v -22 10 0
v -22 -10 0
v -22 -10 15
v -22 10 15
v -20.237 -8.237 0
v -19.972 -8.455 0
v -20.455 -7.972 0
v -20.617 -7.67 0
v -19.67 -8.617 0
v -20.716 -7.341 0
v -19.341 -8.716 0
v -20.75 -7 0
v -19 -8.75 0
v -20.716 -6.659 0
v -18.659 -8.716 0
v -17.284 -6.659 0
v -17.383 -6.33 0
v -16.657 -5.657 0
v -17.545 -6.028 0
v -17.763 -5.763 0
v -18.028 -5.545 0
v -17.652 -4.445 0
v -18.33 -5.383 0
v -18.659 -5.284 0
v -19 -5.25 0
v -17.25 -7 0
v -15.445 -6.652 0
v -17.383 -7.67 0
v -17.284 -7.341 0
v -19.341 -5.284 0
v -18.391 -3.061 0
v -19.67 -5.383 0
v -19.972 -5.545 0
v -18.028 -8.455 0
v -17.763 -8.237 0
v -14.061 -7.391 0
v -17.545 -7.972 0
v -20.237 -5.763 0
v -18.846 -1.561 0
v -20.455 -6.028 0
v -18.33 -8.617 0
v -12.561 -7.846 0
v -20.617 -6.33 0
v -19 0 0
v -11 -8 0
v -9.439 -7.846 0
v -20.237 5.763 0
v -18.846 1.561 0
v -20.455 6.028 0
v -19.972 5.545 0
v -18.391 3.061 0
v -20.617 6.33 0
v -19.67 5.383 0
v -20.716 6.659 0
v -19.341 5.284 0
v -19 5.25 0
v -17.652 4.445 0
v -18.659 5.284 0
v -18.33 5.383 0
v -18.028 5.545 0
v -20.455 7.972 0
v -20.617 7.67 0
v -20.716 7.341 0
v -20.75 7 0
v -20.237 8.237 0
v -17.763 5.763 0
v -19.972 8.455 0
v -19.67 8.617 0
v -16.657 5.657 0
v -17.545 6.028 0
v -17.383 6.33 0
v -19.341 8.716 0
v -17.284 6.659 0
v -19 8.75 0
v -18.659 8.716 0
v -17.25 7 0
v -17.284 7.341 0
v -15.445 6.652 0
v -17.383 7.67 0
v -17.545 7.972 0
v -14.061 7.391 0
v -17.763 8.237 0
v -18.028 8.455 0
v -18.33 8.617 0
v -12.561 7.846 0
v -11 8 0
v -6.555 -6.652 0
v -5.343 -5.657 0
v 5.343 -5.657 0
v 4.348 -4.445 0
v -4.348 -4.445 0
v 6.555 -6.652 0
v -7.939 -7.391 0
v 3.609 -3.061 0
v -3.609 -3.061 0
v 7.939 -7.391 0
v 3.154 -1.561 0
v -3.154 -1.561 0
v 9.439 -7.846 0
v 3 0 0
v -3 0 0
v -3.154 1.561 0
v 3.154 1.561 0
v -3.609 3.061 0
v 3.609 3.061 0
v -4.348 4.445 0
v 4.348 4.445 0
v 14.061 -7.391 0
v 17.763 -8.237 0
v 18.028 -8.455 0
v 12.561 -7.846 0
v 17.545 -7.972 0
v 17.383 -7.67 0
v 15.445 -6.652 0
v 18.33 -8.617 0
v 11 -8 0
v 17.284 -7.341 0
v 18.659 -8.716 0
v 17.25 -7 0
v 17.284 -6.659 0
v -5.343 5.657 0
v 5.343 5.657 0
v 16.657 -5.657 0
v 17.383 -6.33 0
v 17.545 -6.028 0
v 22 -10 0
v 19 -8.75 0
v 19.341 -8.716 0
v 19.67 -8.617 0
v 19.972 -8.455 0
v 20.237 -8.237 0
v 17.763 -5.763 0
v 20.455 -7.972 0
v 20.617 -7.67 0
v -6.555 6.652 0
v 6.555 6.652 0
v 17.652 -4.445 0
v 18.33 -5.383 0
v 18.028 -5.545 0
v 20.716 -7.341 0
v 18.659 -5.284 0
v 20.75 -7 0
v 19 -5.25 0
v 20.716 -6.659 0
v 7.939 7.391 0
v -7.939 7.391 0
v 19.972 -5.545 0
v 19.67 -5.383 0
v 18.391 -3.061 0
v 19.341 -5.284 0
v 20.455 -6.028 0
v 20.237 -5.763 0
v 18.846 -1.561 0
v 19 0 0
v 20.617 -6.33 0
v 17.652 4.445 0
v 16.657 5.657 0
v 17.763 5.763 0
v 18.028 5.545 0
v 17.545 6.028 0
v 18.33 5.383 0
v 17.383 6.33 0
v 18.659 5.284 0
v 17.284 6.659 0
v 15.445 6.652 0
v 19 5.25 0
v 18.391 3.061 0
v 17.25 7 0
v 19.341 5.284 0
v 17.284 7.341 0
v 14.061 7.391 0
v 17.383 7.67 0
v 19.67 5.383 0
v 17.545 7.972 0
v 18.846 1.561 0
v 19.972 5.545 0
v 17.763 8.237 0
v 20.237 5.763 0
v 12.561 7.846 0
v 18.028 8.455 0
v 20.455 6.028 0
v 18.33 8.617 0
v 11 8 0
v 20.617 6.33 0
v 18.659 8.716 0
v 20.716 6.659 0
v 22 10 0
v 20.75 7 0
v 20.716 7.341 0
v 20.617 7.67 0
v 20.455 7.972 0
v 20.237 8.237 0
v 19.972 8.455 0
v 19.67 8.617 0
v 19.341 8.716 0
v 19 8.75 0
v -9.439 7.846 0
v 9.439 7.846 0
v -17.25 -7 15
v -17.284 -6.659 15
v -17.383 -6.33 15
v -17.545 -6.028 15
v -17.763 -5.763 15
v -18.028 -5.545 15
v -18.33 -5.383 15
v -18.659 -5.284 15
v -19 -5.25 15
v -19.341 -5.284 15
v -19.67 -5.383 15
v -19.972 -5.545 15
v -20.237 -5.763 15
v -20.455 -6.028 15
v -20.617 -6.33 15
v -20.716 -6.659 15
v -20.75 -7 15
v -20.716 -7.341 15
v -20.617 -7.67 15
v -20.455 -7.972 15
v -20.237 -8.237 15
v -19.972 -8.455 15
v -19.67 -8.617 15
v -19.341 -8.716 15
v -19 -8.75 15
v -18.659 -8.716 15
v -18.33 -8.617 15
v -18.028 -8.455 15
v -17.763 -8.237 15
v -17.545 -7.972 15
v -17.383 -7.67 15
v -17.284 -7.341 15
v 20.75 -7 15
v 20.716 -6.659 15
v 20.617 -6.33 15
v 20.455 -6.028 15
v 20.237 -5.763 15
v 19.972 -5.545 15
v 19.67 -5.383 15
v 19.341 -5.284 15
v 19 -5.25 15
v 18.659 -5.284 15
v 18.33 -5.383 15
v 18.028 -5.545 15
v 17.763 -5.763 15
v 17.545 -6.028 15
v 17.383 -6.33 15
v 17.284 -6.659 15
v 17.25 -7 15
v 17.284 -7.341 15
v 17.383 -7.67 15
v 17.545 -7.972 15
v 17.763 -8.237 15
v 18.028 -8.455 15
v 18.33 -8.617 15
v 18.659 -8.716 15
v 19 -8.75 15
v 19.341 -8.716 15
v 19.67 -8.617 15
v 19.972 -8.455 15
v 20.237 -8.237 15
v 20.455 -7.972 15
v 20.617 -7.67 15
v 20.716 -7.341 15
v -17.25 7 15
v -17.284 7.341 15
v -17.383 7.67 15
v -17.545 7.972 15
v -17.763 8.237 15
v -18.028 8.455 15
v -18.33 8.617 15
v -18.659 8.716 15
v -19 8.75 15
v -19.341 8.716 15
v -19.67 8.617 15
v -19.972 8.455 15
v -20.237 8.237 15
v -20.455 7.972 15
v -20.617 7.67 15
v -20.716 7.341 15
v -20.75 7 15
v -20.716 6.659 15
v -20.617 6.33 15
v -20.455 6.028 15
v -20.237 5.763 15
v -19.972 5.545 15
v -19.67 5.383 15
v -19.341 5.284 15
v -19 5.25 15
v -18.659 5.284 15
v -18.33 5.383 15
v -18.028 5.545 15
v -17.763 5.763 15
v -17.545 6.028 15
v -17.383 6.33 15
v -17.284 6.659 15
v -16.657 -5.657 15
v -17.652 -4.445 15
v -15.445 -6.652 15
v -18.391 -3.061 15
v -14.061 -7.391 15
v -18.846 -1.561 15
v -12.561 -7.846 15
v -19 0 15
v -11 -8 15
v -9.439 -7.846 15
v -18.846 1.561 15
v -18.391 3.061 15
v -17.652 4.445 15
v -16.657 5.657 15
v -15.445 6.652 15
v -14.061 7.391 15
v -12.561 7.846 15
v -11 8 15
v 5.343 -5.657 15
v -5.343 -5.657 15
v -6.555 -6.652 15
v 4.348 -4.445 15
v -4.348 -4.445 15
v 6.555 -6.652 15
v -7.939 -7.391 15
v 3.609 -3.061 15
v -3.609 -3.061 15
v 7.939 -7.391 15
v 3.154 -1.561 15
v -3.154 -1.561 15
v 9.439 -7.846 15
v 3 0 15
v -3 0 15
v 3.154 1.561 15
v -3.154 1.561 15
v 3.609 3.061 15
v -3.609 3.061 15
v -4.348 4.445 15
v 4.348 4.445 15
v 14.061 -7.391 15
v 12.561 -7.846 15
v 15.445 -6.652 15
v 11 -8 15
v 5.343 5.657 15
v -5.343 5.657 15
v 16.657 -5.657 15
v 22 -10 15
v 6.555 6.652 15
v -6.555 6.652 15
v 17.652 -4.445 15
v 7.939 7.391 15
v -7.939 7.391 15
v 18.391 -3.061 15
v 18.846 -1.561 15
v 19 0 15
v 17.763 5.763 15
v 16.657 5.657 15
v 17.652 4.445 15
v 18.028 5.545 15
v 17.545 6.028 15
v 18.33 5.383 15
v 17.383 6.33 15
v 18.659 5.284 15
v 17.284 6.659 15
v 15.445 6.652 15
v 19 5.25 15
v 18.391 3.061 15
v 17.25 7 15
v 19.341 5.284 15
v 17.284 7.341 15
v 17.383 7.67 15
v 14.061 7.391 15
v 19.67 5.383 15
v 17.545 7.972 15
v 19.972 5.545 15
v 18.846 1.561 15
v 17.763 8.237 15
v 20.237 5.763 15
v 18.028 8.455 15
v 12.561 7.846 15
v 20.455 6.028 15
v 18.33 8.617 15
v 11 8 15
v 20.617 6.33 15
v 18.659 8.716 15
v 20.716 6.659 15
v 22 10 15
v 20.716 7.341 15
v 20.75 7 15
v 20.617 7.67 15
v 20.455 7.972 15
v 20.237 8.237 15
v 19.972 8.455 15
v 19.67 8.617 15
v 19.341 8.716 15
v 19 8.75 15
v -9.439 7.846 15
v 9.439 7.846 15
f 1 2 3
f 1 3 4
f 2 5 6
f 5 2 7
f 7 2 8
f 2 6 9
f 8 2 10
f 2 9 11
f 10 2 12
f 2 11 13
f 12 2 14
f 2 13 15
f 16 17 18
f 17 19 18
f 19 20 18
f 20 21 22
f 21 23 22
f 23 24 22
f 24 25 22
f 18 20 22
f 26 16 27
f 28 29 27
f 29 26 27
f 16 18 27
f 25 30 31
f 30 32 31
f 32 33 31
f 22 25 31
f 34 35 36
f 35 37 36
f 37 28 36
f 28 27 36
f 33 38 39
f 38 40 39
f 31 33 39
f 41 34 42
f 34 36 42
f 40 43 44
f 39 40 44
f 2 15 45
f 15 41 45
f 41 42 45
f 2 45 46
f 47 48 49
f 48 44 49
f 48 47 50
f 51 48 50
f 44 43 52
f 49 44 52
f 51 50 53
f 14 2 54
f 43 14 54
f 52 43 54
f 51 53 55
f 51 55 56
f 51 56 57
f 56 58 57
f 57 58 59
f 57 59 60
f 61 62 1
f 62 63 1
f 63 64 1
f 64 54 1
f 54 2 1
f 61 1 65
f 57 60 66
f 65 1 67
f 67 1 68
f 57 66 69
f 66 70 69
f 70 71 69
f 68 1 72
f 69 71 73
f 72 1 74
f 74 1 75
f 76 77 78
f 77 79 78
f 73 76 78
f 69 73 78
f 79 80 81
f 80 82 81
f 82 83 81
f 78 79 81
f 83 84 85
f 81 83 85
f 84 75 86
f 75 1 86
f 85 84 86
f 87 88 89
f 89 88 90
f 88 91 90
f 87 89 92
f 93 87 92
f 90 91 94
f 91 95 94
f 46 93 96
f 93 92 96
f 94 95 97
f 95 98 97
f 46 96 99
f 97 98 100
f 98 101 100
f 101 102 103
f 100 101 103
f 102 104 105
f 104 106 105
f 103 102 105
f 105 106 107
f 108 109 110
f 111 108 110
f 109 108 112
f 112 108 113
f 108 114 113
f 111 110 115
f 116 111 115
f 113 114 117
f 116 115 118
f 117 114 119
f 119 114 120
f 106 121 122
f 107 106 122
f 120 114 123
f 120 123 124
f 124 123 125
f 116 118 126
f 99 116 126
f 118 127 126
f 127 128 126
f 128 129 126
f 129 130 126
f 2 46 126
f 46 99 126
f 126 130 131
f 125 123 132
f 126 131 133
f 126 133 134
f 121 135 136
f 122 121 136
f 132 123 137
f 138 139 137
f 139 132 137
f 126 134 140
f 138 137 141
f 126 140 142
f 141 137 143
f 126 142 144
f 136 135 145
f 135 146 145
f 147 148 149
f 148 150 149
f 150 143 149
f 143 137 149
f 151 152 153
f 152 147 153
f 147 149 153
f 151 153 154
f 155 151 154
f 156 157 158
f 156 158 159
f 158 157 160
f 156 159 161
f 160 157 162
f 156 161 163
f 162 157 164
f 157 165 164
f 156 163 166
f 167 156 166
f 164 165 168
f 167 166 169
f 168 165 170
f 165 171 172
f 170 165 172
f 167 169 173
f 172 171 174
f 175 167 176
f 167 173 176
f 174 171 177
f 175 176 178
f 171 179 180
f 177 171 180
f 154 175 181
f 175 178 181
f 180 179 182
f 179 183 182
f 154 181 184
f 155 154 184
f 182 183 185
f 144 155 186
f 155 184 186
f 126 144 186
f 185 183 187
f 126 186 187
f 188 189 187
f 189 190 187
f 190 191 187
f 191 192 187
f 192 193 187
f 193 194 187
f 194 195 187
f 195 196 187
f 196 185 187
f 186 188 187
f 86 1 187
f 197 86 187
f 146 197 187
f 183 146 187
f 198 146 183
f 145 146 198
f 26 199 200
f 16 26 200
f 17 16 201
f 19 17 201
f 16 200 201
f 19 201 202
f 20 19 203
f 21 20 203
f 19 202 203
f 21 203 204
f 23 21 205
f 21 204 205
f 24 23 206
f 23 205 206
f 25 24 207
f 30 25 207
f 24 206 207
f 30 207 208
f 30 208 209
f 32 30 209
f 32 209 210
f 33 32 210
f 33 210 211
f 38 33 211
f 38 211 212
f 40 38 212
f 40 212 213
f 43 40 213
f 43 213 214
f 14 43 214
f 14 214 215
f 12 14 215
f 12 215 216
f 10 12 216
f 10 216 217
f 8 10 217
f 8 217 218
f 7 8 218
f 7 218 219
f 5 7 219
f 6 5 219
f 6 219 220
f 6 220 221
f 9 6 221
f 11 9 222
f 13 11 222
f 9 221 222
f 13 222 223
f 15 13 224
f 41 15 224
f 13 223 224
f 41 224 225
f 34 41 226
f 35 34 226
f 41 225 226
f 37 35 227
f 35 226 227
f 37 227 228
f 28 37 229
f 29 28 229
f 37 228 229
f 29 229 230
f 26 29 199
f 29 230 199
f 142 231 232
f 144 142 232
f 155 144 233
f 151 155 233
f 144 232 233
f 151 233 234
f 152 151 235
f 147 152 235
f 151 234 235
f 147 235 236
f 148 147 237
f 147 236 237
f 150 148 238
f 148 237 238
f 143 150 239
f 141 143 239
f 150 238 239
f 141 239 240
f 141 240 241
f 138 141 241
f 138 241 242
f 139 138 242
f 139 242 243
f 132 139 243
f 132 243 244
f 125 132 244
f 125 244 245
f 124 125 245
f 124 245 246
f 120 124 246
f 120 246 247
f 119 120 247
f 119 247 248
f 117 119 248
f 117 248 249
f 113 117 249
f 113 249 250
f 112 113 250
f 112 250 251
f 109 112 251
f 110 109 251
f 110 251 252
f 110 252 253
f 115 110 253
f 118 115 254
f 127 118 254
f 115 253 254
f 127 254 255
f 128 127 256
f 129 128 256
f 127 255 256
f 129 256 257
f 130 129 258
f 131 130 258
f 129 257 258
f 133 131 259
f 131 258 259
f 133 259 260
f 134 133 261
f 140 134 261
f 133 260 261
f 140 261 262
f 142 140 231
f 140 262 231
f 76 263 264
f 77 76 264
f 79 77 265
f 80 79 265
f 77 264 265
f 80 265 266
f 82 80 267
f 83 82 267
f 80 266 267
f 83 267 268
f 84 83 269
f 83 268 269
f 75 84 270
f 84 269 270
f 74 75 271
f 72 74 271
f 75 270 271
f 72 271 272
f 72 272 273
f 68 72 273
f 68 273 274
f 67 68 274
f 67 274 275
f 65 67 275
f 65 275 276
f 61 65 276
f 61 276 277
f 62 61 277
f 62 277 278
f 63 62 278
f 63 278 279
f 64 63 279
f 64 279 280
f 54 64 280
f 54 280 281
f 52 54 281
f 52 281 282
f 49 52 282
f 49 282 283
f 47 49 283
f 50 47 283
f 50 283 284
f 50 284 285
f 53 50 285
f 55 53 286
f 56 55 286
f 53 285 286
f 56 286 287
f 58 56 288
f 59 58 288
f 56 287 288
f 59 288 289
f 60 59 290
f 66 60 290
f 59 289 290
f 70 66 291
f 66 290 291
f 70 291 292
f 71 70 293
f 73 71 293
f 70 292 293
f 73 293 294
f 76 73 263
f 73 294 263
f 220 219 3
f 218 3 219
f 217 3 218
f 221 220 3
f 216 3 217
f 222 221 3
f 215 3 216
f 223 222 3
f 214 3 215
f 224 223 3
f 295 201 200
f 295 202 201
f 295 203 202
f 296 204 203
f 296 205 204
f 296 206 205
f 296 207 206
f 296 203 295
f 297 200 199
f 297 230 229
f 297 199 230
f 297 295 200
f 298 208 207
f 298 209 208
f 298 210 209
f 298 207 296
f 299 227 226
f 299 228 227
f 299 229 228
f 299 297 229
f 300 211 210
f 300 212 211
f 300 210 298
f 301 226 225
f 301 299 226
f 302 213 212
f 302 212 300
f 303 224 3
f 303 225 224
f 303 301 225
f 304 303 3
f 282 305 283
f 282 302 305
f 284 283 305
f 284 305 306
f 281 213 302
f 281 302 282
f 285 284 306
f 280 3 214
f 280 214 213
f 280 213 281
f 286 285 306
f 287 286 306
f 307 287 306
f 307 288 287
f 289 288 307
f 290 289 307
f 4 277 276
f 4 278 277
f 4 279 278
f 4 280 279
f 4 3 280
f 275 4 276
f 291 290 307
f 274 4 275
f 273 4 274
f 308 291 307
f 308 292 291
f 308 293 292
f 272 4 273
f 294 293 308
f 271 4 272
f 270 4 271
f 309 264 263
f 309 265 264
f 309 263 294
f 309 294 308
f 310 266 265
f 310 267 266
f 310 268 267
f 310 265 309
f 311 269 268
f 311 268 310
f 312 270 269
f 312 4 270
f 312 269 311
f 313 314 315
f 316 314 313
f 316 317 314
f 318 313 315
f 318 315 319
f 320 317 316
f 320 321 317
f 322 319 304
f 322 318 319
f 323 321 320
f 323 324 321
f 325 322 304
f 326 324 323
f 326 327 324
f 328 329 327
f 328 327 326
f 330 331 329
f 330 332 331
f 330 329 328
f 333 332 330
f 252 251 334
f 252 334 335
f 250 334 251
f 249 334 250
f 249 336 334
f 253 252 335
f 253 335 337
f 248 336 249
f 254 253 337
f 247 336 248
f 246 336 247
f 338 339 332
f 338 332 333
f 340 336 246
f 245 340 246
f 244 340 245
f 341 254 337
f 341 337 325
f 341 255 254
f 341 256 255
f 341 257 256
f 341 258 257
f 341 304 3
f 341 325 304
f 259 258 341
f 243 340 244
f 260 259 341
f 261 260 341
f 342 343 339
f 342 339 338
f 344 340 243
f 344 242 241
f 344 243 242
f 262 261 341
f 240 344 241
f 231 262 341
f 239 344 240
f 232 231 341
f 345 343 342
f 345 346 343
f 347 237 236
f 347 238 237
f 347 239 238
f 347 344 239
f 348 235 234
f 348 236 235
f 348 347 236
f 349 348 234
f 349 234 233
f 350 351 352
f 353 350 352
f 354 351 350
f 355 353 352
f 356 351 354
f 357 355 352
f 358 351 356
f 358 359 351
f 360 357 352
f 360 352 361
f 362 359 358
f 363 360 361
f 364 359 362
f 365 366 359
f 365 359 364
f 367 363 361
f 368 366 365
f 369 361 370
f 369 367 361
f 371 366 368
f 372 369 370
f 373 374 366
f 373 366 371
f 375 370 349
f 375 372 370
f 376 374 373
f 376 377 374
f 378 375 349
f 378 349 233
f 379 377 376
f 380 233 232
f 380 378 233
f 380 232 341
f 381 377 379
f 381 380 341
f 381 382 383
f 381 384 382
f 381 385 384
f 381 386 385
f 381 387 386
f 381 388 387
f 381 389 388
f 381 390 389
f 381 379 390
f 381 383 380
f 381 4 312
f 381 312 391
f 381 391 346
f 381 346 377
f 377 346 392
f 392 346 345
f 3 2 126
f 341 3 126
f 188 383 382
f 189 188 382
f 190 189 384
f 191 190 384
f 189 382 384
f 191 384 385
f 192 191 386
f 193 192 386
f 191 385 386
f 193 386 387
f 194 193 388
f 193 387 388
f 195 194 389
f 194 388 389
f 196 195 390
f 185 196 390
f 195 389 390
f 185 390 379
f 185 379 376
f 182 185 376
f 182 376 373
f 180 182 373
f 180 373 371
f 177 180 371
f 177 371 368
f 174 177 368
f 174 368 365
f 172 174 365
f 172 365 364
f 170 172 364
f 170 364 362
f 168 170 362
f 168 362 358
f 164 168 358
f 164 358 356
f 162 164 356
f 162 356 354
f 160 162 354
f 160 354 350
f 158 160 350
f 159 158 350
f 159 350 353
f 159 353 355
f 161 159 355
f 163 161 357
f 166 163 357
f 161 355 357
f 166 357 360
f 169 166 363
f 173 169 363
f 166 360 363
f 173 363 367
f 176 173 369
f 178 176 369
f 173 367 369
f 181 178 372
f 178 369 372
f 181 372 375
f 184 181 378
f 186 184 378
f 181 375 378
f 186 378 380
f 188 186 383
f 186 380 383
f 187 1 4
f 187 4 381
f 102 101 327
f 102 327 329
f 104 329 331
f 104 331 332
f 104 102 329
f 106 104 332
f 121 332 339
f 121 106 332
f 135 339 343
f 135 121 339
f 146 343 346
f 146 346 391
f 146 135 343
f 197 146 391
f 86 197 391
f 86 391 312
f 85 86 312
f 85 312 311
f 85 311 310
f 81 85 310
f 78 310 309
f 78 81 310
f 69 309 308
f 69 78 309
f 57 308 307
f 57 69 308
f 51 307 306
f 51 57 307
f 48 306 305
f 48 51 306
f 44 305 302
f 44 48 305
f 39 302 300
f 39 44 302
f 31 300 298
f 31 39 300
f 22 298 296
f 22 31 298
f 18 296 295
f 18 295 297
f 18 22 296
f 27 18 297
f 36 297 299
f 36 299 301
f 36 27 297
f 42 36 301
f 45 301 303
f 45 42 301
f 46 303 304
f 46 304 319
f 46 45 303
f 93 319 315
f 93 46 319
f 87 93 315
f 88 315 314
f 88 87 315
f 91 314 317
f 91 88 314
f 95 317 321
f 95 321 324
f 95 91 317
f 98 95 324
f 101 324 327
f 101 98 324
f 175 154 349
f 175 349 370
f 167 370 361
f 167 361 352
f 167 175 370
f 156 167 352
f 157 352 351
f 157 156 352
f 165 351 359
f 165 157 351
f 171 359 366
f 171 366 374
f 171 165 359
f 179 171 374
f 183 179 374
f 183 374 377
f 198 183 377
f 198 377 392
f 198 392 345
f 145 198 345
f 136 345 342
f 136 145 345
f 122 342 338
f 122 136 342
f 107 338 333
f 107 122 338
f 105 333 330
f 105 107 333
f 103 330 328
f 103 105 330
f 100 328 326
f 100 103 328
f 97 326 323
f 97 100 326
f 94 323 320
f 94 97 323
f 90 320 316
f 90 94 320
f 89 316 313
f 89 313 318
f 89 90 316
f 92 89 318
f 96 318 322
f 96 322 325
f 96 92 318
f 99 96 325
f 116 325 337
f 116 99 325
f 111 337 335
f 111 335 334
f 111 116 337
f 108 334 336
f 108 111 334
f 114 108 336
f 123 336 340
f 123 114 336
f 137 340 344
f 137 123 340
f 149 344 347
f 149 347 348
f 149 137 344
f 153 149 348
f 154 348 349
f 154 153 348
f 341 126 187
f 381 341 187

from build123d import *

# Parameters (mm, degrees)
CROQUIS1_W              = 44
CROQUIS1_H              = 20
CROQUIS1_R              = 8
SALIENTE_EXTRUIR1_DEPTH = 15
CROQUIS2_R              = 1.75
CORTAR_EXTRUIR1_DEPTH   = 22


with BuildPart() as part:
    # Croquis1 → Saliente-Extruir1 (new body)
    with BuildSketch(Plane.XY):
        Rectangle(CROQUIS1_W, CROQUIS1_H)
        with Locations((-11, 0)):
            Circle(CROQUIS1_R, mode=Mode.SUBTRACT)
        with Locations((11, 0)):
            Circle(CROQUIS1_R, mode=Mode.SUBTRACT)
    extrude(amount=SALIENTE_EXTRUIR1_DEPTH)

    # Croquis2 → Cortar-Extruir1 (cut)
    with BuildSketch(Plane.XY.offset(15)):
        with Locations((-19, 7)):
            Circle(CROQUIS2_R)
        with Locations((19, -7)):
            Circle(CROQUIS2_R)
        with Locations((19, 7)):
            Circle(CROQUIS2_R)
        with Locations((-19, -7)):
            Circle(CROQUIS2_R)
    extrude(amount=-CORTAR_EXTRUIR1_DEPTH, mode=Mode.SUBTRACT)


solid = part.part
